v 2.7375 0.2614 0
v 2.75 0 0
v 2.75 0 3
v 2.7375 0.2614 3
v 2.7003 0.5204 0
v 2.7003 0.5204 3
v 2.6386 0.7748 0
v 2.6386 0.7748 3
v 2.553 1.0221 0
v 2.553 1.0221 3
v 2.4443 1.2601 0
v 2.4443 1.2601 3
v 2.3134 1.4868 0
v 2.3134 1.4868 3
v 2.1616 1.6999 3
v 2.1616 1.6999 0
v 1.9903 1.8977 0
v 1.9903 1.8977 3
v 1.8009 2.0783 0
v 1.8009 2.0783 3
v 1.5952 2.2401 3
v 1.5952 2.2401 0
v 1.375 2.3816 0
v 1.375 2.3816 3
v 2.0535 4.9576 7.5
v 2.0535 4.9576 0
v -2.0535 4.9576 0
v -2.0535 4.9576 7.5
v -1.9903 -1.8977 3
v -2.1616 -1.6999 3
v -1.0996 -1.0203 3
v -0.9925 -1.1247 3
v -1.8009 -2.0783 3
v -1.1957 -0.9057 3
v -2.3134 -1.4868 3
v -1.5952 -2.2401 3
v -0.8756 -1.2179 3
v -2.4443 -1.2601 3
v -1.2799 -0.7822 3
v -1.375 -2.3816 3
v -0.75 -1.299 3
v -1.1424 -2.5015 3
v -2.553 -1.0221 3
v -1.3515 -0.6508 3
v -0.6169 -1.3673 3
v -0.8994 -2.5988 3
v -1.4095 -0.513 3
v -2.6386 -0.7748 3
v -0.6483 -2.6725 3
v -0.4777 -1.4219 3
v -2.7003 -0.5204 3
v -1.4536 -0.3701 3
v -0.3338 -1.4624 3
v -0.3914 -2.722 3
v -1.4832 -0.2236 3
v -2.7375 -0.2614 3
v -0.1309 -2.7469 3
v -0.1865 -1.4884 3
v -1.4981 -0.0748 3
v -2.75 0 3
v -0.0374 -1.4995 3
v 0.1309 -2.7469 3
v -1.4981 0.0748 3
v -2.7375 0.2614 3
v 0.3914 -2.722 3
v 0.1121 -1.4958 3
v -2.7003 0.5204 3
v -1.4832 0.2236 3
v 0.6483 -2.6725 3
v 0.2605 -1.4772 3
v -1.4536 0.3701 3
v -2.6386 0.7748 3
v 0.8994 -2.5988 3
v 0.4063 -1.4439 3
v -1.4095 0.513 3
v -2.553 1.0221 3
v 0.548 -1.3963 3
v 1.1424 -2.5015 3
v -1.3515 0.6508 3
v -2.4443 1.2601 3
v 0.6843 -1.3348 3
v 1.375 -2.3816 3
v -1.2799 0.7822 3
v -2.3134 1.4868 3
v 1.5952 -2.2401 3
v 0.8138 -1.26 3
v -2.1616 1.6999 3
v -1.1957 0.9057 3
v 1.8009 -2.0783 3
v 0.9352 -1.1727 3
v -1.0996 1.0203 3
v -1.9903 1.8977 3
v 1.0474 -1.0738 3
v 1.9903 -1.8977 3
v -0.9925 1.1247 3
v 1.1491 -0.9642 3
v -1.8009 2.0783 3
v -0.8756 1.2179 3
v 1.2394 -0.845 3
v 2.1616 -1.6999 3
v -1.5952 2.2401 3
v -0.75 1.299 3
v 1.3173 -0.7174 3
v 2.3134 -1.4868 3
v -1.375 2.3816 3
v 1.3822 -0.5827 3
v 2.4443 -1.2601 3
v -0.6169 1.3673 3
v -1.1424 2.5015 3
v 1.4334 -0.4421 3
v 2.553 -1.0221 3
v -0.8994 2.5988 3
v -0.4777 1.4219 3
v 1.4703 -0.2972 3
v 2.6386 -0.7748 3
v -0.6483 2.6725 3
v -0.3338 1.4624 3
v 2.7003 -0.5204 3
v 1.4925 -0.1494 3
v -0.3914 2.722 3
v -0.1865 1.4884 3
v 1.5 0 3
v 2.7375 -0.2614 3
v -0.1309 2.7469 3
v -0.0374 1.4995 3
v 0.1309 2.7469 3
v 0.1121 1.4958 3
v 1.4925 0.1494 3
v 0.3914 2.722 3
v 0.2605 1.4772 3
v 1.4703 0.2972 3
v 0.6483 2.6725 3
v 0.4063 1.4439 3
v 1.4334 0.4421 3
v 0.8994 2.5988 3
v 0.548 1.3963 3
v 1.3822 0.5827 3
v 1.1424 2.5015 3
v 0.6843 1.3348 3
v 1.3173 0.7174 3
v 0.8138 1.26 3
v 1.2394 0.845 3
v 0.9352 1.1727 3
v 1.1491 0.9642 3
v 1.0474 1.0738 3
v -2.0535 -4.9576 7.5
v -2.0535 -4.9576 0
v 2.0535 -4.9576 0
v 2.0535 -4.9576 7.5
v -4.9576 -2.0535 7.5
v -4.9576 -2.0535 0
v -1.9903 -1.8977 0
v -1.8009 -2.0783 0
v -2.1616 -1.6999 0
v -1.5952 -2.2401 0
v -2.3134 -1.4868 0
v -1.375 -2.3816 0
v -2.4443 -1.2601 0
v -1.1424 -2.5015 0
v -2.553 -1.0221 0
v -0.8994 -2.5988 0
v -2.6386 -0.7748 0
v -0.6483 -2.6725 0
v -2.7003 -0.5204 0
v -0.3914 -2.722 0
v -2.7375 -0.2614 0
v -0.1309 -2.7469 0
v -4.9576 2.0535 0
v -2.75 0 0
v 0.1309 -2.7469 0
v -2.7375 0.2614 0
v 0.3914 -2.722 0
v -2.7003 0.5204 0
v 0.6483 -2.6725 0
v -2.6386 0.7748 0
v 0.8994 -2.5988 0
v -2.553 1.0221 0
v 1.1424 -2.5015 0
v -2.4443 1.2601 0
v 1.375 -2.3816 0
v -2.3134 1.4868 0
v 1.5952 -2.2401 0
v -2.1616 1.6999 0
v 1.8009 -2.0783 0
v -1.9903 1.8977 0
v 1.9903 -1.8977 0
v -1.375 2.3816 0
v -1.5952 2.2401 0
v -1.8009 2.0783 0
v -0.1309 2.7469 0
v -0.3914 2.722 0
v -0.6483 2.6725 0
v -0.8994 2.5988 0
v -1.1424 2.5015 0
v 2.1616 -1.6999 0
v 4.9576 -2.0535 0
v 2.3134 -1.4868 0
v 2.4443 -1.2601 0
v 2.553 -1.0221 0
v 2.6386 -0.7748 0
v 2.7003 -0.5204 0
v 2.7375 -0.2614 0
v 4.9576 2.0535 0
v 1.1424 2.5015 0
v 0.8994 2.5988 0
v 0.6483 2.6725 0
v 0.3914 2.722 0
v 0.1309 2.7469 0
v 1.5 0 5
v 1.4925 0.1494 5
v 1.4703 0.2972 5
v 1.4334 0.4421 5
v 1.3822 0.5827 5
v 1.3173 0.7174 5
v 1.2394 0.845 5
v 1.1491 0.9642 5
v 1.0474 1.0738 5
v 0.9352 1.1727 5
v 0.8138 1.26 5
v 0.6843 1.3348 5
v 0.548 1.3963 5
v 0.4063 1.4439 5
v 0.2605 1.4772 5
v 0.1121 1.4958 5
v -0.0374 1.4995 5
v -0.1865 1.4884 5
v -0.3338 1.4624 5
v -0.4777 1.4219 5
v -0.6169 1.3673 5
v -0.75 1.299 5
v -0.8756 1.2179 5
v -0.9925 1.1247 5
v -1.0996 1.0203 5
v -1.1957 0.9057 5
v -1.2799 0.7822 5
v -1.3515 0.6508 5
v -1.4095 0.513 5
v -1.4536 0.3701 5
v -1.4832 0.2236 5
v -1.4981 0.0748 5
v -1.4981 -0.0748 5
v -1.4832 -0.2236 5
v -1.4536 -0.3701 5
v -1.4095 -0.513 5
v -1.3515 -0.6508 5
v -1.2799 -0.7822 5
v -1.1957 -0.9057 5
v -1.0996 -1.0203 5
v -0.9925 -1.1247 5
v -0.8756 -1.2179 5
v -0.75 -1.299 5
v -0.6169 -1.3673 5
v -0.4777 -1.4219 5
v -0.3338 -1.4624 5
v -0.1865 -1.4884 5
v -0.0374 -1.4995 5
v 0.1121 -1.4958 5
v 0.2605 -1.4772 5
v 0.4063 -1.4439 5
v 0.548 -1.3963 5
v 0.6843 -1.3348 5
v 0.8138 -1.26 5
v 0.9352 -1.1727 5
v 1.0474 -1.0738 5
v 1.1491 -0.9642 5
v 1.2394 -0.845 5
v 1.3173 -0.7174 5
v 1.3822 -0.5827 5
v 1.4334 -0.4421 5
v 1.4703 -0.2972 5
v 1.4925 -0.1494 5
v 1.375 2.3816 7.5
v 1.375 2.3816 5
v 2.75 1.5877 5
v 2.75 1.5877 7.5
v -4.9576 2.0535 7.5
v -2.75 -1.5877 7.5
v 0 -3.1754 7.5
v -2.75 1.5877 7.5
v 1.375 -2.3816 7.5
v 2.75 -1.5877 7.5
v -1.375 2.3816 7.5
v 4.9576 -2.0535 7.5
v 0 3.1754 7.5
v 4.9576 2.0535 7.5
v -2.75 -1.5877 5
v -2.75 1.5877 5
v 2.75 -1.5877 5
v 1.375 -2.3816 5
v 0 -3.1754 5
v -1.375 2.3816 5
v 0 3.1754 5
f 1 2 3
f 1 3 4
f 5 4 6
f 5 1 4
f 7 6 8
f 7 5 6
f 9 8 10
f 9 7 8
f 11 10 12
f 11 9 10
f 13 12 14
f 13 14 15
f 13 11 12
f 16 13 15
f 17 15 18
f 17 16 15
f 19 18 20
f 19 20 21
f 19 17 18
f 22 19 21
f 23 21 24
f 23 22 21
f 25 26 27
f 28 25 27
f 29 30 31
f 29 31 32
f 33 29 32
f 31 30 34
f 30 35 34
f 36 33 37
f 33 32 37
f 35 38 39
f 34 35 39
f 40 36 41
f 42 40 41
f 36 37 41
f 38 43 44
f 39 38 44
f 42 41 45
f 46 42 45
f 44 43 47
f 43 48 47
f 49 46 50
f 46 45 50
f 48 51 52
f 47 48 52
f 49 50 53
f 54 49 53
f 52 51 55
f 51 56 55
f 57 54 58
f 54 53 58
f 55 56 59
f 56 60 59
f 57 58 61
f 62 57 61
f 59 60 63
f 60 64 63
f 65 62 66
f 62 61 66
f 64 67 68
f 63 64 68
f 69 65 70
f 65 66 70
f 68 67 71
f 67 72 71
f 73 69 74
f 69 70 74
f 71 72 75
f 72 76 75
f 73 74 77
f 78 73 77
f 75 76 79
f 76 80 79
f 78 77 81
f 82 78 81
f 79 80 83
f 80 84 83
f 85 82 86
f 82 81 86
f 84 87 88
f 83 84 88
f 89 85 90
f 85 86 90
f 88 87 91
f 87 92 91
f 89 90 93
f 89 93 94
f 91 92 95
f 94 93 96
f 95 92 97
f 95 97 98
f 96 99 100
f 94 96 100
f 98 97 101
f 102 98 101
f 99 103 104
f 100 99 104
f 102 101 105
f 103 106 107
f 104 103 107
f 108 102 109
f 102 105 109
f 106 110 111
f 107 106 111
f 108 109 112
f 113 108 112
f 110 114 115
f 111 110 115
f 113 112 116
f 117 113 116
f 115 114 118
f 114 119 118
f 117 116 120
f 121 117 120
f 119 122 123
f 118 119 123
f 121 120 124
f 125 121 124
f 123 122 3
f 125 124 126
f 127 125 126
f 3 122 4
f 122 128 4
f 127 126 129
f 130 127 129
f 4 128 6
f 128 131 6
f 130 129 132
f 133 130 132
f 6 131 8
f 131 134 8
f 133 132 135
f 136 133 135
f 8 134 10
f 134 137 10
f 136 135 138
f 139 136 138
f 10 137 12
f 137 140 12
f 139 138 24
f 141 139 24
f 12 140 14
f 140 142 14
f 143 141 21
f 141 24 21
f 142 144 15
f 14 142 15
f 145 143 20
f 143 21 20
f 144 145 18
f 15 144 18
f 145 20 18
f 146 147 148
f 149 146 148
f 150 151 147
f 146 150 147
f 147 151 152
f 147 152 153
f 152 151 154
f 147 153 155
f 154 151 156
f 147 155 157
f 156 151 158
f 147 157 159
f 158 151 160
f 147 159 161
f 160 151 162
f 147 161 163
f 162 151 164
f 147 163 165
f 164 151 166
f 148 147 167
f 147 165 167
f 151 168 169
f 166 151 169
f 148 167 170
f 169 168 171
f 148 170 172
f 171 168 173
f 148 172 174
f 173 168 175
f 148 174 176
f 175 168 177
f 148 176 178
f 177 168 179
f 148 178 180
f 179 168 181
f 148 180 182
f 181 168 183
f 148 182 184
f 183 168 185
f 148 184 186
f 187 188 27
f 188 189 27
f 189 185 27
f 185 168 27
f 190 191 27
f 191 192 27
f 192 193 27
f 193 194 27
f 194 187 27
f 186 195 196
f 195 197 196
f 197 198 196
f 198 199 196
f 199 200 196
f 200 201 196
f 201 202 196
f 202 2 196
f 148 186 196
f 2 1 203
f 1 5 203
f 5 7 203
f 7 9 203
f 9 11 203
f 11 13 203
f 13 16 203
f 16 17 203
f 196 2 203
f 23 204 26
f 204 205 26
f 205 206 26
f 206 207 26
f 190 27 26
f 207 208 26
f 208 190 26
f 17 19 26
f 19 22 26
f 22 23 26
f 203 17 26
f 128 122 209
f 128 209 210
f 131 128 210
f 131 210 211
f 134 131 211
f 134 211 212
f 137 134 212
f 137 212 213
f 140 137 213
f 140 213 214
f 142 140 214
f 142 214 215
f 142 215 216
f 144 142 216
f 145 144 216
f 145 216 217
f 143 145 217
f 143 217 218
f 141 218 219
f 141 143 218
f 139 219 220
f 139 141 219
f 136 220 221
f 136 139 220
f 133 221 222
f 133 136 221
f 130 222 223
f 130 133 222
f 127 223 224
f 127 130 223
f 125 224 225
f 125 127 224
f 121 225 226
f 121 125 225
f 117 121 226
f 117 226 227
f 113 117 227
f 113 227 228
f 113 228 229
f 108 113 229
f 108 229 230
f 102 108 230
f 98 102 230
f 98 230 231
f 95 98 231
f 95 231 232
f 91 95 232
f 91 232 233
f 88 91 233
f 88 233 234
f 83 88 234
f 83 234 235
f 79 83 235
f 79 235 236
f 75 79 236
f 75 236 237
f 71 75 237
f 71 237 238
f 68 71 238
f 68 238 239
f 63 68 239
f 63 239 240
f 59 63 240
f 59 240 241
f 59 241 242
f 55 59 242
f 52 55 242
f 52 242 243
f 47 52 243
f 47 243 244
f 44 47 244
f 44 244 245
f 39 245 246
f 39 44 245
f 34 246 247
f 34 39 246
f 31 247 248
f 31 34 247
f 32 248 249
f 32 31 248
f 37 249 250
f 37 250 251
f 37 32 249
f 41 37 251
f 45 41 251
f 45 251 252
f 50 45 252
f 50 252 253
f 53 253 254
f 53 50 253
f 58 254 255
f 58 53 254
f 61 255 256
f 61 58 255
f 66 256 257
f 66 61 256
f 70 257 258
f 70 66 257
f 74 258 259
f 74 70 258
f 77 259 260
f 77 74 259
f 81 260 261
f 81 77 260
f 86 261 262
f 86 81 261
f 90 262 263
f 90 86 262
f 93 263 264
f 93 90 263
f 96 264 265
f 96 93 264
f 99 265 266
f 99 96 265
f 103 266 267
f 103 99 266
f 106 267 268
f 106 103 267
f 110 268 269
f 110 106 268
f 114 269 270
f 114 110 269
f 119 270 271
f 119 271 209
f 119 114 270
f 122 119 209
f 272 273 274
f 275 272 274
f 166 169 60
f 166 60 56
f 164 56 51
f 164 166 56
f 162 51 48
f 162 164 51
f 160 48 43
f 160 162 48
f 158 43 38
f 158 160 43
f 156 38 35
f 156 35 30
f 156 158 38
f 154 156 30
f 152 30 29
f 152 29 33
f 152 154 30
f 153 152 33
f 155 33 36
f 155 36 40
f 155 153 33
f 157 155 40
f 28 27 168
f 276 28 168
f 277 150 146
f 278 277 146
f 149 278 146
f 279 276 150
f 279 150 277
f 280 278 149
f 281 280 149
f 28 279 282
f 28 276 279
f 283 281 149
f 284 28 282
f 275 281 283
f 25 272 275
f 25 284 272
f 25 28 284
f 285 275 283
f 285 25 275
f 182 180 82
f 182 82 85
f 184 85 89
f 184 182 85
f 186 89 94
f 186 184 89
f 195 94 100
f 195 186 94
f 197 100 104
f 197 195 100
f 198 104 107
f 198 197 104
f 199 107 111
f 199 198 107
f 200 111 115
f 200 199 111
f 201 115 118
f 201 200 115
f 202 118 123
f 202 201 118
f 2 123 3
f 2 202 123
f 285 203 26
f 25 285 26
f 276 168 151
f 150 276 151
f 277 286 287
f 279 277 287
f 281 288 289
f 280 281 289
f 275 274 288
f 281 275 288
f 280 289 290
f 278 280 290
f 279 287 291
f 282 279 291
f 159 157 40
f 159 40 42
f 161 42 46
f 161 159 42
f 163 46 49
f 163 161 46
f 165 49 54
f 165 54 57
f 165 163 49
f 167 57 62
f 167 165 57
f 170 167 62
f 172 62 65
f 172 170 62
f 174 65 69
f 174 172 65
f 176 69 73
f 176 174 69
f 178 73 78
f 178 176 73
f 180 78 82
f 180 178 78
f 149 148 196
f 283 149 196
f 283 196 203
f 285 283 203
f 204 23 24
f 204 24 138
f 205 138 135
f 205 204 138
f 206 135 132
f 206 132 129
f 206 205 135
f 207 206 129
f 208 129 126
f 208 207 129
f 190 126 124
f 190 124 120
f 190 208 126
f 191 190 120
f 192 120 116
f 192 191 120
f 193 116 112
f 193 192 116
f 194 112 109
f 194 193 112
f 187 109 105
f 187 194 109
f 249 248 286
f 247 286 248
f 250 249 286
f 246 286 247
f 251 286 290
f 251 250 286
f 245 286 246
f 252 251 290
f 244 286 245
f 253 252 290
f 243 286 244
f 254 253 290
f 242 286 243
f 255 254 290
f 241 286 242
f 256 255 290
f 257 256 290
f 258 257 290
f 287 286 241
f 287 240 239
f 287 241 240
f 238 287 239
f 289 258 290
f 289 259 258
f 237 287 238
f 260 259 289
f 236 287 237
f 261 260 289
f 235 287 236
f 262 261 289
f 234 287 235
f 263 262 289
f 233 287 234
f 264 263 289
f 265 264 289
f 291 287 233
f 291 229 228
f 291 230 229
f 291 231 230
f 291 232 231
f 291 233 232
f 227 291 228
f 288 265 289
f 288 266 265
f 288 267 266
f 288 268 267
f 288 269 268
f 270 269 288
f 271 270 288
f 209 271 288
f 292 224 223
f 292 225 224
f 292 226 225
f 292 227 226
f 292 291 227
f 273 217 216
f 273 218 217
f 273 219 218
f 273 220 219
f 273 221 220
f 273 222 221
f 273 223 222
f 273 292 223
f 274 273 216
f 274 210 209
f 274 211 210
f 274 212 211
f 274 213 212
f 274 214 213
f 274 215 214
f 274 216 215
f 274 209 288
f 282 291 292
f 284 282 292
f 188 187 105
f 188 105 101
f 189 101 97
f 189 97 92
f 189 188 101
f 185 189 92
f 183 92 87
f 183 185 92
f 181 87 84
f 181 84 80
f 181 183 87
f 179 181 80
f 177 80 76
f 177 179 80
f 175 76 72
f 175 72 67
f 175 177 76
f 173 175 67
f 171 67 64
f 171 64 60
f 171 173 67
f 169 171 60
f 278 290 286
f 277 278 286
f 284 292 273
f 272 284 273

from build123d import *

# Parameters (mm, degrees)
F1_DEPTH = 7.5
F2_DEPTH = 5
F0_R     = 1.5
F3_DEPTH = 5
F4_DEPTH = 3


with BuildPart() as f1:
    # F0 (on Top) → F1 (new body)
    with BuildSketch(Plane.XY):
        Polygon((2.0535090273, 4.9576093443), (-2.0535090273, 4.9576093443), (-4.9576093443, 2.0535090273), (-4.9576093443, -2.0535090273), (-2.0535090273, -4.9576093443), (2.0535090273, -4.9576093443), (4.9576093443, -2.0535090273), (4.9576093443, 2.0535090273), align=None)
        Polygon((2.75, 1.5877132403), (2.75, 0), (2.75, -1.5877132403), (1.3750001046, -2.3815698), (0, -3.1754264805), (-1.3750000168, -2.3815698507), (-2.75, -1.5877132403), (-2.75, 0), (-2.75, 1.5877132403), (-1.3749999907, 2.3815698658), (0, 3.1754264805), (1.3750000803, 2.381569814), align=None, mode=Mode.SUBTRACT)
    extrude(amount=F1_DEPTH)

    # F0 (on Top) → F2 (join)
    with BuildSketch(Plane.XY):
        with BuildLine():
            ThreePointArc((-2.75, 0), (-2.3815698577, 1.3750000046), (-1.3749999907, 2.3815698658))
            Line((-1.3749999907, 2.3815698658), (-2.75, 1.5877132403))
            Line((-2.75, 1.5877132403), (-2.75, 0))
        make_face()
        with BuildLine():
            ThreePointArc((-1.3749999907, 2.3815698658), (5.17e-08, 2.75), (1.3750000803, 2.381569814))
            Line((1.3750000803, 2.381569814), (0, 3.1754264805))
            Line((0, 3.1754264805), (-1.3749999907, 2.3815698658))
        make_face()
        with BuildLine():
            ThreePointArc((1.3750000803, 2.381569814), (2.3815698836, 1.3749999598), (2.75, 0))
            Line((2.75, 0), (2.75, 1.5877132403))
            Line((2.75, 1.5877132403), (1.3750000803, 2.381569814))
        make_face()
        with BuildLine():
            Line((2.75, -1.5877132403), (2.75, 0))
            ThreePointArc((2.75, 0), (2.3815698906, -1.3749999477), (1.3750001046, -2.3815698))
            Line((1.3750001046, -2.3815698), (2.75, -1.5877132403))
        make_face()
        with BuildLine():
            Line((0, -3.1754264805), (1.3750001046, -2.3815698))
            ThreePointArc((1.3750001046, -2.3815698), (5.07e-08, -2.75), (-1.3750000168, -2.3815698507))
            Line((-1.3750000168, -2.3815698507), (0, -3.1754264805))
        make_face()
        with BuildLine():
            Line((-2.75, -1.5877132403), (-1.3750000168, -2.3815698507))
            ThreePointArc((-1.3750000168, -2.3815698507), (-2.3815698653, -1.3749999916), (-2.75, 0))
            Line((-2.75, 0), (-2.75, -1.5877132403))
        make_face()
    extrude(amount=F2_DEPTH)

    # F0 (on Top) → F3 (join)
    with BuildSketch(Plane.XY):
        with BuildLine():
            ThreePointArc((1.3750001046, -2.3815698), (2.3815698906, -1.3749999477), (2.75, 0))
            ThreePointArc((2.75, 0), (2.3815698836, 1.3749999598), (1.3750000803, 2.381569814))
            ThreePointArc((1.3750000803, 2.381569814), (5.17e-08, 2.75), (-1.3749999907, 2.3815698658))
            ThreePointArc((-1.3749999907, 2.3815698658), (-2.3815698577, 1.3750000046), (-2.75, 0))
            ThreePointArc((-2.75, 0), (-2.3815698653, -1.3749999916), (-1.3750000168, -2.3815698507))
            ThreePointArc((-1.3750000168, -2.3815698507), (5.07e-08, -2.75), (1.3750001046, -2.3815698))
        make_face()
        Circle(F0_R, mode=Mode.SUBTRACT)
    extrude(amount=F3_DEPTH)

    # F0 (on Top) → F4 (cut)
    with BuildSketch(Plane.XY):
        with BuildLine():
            ThreePointArc((1.3750001046, -2.3815698), (2.3815698906, -1.3749999477), (2.75, 0))
            ThreePointArc((2.75, 0), (2.3815698836, 1.3749999598), (1.3750000803, 2.381569814))
            ThreePointArc((1.3750000803, 2.381569814), (5.17e-08, 2.75), (-1.3749999907, 2.3815698658))
            ThreePointArc((-1.3749999907, 2.3815698658), (-2.3815698577, 1.3750000046), (-2.75, 0))
            ThreePointArc((-2.75, 0), (-2.3815698653, -1.3749999916), (-1.3750000168, -2.3815698507))
            ThreePointArc((-1.3750000168, -2.3815698507), (5.07e-08, -2.75), (1.3750001046, -2.3815698))
        make_face()
        Circle(F0_R, mode=Mode.SUBTRACT)
    extrude(amount=F4_DEPTH, mode=Mode.SUBTRACT)


solid = f1.part
